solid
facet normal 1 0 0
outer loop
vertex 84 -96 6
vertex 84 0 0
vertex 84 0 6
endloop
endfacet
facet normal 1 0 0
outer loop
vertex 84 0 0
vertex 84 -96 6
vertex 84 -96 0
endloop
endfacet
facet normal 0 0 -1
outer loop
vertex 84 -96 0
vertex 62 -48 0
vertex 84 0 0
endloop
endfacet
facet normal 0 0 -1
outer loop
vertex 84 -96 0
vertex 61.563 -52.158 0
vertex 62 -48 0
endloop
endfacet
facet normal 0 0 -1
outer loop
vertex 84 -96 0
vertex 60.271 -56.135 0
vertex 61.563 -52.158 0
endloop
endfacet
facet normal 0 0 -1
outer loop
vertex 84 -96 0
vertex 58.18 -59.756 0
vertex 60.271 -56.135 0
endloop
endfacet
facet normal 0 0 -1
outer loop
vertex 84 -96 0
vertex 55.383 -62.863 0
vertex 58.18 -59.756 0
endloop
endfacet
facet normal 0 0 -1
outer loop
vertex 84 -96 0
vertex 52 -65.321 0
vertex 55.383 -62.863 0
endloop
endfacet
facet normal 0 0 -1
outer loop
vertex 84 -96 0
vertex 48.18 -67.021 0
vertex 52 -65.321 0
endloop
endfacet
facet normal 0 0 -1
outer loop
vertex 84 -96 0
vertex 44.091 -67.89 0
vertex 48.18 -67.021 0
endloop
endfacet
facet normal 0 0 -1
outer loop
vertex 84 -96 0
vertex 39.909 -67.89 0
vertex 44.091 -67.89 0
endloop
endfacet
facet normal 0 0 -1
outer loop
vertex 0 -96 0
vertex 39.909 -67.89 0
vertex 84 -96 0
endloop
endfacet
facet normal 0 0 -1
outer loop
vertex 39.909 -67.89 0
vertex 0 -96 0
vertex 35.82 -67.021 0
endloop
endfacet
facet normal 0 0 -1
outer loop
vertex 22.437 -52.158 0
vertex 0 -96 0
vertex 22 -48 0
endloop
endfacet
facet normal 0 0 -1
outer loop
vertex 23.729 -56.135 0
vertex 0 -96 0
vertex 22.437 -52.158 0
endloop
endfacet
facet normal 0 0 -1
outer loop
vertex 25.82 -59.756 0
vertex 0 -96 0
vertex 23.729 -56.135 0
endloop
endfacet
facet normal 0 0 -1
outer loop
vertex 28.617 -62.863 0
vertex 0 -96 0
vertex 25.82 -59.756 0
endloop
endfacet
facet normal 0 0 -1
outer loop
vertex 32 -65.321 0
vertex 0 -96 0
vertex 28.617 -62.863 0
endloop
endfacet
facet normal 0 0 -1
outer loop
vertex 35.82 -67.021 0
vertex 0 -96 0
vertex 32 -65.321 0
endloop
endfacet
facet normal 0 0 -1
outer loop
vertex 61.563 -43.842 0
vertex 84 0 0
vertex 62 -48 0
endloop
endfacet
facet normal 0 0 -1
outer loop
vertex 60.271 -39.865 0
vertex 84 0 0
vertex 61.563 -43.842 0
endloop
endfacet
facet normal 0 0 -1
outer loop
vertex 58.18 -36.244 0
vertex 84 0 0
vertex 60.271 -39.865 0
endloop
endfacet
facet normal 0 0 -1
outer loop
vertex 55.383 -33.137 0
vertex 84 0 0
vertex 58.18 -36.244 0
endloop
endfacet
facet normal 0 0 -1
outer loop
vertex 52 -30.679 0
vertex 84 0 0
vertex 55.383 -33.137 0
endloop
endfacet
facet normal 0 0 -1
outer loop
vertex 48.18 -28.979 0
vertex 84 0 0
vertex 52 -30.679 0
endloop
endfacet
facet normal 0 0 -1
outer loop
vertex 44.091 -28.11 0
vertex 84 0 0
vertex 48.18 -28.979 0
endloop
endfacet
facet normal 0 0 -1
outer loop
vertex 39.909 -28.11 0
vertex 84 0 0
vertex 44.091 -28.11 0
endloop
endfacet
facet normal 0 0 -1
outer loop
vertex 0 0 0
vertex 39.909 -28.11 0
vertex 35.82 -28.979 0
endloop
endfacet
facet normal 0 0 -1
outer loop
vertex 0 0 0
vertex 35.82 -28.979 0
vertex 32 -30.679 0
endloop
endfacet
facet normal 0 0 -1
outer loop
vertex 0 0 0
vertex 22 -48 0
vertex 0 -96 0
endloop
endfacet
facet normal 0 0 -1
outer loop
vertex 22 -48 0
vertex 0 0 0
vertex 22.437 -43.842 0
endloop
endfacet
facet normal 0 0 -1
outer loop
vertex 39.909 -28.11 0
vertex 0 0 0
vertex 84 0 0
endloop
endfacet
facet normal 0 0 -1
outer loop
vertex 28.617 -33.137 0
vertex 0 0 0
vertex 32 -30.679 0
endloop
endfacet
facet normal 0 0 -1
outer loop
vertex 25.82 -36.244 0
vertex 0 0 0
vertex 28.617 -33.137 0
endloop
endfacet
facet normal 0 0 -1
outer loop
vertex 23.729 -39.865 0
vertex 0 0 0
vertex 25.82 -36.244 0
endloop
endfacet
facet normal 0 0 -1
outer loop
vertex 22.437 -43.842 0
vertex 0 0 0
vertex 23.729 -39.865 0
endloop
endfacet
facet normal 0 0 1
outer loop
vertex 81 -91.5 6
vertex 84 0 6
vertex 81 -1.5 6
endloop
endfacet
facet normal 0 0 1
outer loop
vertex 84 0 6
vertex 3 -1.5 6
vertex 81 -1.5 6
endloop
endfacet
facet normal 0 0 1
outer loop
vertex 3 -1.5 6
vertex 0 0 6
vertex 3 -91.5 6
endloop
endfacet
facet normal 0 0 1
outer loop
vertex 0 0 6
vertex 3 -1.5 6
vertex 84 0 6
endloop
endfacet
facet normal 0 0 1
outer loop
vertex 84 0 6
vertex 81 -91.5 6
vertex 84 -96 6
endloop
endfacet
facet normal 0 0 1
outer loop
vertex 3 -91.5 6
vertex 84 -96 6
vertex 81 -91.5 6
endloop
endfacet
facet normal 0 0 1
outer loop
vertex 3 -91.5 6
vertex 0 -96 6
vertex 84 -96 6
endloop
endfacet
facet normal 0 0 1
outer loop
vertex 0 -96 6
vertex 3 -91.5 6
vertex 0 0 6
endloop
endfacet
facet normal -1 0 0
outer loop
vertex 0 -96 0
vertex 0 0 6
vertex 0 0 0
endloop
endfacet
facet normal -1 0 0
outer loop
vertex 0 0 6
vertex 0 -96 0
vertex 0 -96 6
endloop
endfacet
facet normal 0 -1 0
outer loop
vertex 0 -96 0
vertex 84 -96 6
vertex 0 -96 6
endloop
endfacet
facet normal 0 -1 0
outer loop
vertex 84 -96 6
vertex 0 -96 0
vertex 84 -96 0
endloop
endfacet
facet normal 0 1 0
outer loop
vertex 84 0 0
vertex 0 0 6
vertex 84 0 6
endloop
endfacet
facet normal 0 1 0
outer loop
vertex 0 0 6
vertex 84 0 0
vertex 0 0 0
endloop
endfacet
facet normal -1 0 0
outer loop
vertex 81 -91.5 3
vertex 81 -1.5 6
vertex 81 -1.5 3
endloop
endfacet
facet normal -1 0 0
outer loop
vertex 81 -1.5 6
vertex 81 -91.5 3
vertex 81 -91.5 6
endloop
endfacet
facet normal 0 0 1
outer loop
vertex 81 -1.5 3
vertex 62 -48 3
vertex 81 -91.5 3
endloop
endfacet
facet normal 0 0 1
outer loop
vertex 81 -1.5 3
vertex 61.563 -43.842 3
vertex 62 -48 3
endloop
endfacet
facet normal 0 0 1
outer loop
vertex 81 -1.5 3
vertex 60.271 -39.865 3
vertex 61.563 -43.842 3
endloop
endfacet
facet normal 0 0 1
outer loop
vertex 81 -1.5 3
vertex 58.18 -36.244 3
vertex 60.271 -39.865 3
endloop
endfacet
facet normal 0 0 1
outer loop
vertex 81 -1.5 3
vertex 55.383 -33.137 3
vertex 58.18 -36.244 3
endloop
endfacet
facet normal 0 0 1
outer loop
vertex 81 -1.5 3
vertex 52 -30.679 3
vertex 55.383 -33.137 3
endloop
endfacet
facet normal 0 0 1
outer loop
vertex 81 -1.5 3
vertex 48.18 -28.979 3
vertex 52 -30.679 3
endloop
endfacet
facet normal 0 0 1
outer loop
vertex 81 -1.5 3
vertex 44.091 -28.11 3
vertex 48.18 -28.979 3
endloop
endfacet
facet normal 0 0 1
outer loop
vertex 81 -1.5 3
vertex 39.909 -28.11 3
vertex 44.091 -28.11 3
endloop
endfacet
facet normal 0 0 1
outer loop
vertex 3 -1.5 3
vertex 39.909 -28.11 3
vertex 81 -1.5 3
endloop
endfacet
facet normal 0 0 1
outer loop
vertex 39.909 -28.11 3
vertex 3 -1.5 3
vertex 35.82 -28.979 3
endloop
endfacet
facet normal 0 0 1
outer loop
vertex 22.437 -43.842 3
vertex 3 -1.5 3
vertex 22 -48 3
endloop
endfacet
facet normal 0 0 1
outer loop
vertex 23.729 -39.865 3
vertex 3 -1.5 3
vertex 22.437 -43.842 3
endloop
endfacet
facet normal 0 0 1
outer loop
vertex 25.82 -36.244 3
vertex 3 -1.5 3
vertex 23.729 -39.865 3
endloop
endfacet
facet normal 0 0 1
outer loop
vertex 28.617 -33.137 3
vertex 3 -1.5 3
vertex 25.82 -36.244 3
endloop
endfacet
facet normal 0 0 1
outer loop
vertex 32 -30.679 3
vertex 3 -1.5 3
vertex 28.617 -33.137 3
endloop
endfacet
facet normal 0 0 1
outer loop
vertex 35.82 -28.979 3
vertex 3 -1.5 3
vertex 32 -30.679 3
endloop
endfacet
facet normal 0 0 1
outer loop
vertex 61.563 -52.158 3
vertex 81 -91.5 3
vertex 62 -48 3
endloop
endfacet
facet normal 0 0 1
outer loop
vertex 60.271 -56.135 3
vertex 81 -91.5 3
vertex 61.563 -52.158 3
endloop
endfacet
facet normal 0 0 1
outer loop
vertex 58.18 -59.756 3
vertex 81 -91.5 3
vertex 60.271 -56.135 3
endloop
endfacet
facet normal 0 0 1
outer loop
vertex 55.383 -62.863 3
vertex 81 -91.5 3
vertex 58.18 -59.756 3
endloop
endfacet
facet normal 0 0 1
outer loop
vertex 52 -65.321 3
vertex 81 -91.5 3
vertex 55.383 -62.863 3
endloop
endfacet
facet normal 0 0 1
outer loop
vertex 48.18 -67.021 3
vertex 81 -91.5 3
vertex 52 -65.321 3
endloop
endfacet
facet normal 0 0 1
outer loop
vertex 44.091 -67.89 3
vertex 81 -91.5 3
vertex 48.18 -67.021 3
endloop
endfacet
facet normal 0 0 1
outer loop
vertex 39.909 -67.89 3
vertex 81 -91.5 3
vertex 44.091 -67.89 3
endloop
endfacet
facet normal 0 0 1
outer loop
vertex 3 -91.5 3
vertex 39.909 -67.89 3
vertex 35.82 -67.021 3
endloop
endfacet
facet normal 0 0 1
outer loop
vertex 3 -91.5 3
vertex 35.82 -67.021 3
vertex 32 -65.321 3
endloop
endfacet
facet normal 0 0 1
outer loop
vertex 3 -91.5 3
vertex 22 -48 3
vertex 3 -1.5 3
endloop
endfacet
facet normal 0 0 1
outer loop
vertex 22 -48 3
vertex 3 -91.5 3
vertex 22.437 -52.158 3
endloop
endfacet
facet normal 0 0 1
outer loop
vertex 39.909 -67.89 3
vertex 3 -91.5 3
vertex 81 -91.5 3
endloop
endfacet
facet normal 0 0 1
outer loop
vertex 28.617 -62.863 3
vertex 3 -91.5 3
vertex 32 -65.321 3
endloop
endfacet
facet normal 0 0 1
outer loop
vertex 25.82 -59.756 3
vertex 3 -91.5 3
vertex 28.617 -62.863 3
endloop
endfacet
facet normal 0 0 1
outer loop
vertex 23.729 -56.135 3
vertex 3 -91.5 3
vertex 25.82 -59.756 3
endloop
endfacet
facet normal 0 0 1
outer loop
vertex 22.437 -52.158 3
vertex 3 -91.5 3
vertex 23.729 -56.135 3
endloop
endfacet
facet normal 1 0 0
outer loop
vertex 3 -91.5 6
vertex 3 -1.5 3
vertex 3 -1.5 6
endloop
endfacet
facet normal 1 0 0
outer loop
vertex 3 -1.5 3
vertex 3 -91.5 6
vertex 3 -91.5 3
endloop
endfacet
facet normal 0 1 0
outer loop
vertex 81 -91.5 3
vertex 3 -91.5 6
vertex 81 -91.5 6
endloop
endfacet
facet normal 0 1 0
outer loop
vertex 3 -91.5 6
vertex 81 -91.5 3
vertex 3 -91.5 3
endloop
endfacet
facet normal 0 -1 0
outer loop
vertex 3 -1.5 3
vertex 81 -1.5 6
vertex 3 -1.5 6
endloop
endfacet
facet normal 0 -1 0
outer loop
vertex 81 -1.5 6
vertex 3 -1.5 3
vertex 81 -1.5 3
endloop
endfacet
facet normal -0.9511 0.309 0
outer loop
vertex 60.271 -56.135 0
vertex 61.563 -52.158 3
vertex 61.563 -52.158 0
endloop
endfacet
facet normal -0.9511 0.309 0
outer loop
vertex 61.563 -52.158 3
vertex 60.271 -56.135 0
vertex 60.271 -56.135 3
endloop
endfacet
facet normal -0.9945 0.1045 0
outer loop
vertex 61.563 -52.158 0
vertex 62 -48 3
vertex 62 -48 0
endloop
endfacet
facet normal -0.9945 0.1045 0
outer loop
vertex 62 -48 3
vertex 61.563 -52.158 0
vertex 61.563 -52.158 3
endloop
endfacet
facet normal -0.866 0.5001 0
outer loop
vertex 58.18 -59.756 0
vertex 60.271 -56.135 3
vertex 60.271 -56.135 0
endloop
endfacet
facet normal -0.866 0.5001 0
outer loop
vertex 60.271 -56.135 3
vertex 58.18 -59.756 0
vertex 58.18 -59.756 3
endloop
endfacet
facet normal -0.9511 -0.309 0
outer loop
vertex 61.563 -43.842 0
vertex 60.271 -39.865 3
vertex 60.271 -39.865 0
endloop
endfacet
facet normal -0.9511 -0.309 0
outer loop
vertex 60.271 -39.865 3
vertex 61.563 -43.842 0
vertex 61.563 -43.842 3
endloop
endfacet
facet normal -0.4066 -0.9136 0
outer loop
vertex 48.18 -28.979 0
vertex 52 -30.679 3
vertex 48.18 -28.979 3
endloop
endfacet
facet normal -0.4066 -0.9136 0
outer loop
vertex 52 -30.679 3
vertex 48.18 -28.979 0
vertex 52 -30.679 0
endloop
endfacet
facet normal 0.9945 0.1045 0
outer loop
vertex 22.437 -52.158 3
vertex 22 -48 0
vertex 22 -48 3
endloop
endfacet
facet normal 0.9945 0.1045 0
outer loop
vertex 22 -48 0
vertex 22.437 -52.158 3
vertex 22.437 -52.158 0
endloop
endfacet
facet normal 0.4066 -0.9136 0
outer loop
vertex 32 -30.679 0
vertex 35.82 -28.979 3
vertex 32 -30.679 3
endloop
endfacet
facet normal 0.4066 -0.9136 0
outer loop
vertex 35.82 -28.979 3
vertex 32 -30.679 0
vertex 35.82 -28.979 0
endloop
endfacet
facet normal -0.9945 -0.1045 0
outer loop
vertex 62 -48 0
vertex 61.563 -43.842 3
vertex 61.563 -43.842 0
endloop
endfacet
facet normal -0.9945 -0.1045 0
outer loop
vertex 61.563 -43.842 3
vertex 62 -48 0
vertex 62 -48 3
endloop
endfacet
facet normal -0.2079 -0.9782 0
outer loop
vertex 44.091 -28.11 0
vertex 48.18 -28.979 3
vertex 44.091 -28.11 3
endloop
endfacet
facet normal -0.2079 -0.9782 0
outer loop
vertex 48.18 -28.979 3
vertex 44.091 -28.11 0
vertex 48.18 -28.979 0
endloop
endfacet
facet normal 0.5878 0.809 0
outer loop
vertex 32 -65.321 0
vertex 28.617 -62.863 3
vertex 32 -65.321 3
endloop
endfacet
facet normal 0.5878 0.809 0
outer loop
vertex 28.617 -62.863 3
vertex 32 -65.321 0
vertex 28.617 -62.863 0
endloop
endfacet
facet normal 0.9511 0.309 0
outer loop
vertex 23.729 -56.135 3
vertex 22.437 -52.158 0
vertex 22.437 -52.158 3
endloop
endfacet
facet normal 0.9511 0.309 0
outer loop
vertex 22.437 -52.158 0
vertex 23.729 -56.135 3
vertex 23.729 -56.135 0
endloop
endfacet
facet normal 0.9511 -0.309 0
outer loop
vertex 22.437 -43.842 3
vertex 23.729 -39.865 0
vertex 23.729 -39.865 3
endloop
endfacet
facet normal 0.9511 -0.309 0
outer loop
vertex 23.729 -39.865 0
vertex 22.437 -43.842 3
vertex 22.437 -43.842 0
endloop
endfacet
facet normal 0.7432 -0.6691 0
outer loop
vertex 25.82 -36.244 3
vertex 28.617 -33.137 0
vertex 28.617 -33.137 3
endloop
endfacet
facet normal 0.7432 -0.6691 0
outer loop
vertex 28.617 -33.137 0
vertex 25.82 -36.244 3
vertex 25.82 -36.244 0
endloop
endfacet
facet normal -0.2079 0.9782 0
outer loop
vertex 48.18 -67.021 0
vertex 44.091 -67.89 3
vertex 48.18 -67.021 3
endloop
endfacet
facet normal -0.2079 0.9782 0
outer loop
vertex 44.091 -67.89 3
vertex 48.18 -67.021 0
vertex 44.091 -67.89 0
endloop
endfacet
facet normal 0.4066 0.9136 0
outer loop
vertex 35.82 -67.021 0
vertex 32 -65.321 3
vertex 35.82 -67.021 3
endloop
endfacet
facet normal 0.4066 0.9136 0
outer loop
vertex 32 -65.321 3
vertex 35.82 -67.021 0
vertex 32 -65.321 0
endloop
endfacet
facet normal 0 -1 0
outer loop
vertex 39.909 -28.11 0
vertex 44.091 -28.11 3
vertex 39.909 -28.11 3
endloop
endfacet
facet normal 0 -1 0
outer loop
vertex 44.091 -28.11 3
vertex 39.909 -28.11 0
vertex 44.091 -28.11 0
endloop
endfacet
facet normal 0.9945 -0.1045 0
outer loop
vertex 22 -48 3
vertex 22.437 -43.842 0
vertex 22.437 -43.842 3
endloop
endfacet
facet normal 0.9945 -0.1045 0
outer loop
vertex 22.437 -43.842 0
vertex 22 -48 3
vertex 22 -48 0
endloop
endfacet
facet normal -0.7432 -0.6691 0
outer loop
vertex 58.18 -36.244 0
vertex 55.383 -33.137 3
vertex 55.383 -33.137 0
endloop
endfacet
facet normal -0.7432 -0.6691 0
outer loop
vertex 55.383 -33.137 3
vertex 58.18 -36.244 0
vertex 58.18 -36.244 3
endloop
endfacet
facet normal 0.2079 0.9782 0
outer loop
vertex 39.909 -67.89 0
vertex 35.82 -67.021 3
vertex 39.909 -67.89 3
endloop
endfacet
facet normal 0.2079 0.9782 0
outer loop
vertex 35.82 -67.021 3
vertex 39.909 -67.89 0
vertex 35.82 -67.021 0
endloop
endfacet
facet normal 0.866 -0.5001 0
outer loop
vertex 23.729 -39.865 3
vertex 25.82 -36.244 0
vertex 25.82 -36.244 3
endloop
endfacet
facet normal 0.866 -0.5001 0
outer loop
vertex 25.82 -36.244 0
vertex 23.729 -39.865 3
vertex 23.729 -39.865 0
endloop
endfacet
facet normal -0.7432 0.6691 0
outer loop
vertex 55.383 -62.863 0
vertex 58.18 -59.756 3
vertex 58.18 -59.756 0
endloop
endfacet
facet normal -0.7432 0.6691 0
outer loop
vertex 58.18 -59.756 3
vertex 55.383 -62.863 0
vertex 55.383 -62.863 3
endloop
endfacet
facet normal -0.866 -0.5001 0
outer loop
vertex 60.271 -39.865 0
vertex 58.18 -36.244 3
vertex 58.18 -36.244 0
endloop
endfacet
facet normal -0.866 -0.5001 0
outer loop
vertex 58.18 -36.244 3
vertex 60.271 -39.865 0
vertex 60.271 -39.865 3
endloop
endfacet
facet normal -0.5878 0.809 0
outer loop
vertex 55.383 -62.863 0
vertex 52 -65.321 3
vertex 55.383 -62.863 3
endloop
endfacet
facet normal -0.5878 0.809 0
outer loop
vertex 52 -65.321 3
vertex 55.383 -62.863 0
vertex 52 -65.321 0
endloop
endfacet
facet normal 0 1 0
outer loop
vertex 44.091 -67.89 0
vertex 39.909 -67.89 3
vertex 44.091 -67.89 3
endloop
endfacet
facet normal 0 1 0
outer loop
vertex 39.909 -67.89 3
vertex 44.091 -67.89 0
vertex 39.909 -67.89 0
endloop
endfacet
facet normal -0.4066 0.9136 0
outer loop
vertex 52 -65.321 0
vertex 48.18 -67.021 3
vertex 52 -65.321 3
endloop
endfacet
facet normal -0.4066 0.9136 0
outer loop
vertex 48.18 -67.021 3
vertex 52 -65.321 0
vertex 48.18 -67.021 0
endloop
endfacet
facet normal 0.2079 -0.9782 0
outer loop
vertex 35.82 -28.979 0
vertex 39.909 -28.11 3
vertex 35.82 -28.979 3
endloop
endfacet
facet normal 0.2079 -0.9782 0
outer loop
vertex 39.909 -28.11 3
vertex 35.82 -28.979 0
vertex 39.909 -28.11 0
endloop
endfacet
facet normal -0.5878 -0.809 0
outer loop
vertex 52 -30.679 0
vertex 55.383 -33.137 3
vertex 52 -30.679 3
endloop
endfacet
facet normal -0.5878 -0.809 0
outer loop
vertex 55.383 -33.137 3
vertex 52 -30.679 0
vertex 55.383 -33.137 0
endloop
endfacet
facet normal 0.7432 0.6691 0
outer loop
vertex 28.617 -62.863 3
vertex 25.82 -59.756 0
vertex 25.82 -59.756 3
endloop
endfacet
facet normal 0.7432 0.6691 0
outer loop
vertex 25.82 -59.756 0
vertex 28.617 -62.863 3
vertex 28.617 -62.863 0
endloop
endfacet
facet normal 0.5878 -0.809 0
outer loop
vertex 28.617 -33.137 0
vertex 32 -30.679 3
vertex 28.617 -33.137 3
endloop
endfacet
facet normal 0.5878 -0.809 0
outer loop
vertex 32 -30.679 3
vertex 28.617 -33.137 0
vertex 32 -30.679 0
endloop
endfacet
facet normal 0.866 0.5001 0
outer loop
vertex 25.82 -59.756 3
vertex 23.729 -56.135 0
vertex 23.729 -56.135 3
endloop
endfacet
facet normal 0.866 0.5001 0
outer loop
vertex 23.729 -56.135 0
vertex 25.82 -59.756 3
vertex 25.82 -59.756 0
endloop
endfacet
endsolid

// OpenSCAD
// file: ../../../../neje-dk-8-kz-bed.scad
module nejeDk8KzBed()
{
	xLength = nejeDk8KzBed_xLength();
	yLength = nejeDk8KzBed_yLength();
	zLength = nejeDk8KzBed_zLength();

	cube([xLength, yLength, zLength]);
}

/** Support functions and modules follow. **/

function nejeDk8KzBed_xLength() = 78;

function nejeDk8KzBed_yLength() = 90;

function nejeDk8KzBed_zLength() = 3;
// file: ../../../../../laser-engraver-jig.scad
module laserEngraverJig(bed_xLength, bed_yLength, bed_zLength,
						xLength, yLength, zLength)
{
	laserEngraverJig_base(bed_xLength, bed_yLength, bed_zLength,
						  xLength, yLength, zLength);
}

/** Support functions and modules follow. **/

module laserEngraverJig_base(bed_xLength, bed_yLength, bed_zLength,
							 xLength, yLength, zLength)
{
	difference()
	{
		// main block
		cube([xLength, yLength, zLength]);

		// bed cutout
		xTranslate = (xLength - bed_xLength) / 2.0;
		yTranslate = (yLength - bed_yLength) / 2.0;
		color("green")
		translate([xTranslate, yTranslate, -0.01])
		cube([bed_xLength, bed_yLength, bed_zLength + 0.01]);
	}
}
// file: ../../neje-laser-engraver-disk-jig.scad
use <../../../laser-engraver-jig.scad>

use <../../neje-dk-8-kz-bed.scad>

module nejeLaserEngraverDiskJig(diameter = 40)
{
	bed_xLength = nejeDk8KzBed_xLength();
	bed_yLength = nejeDk8KzBed_yLength();
	bed_zLength = nejeDk8KzBed_zLength();

	xyIncrease = 3 * 2;

	xLength = nejeDk8KzBed_xLength() + xyIncrease;
	yLength = nejeDk8KzBed_yLength() + xyIncrease;
	zLength = nejeLaserEngraverDiskJig_zLength();

	difference()
	{
		nejeLaserEngraverDiskJig_block(bed_xLength, bed_yLength, bed_zLength,
						 			   xLength, yLength, zLength);

		nejeLaserEngraverDiskJig_cutout(diameter, xLength, yLength, zLength);
	}
}

/** Support functions and modules follow. **/

function nejeLaserEngraverDiskJig_zLength() = nejeDk8KzBed_zLength() * 2;

module nejeLaserEngraverDiskJig_block(bed_xLength, bed_yLength, bed_zLength,
				 					  xLength, yLength, zLength)
{
	laserEngraverJig(bed_xLength, bed_yLength, bed_zLength,
					 xLength, yLength, zLength);
}

module nejeLaserEngraverDiskJig_cutout(diameter, xLength, yLength, zLength)
{
	radius = diameter / 2.0;
	xTranslate = xLength / 2.0;
	yTranslate = yLength / 2.0;
	translate([xTranslate, yTranslate, -0.01])
	cylinder(r=radius, h=10);
}
// main file
use <../../neje-laser-engraver-disk-jig.scad>

cutoutDiameter = 40; // [5:100]

zTranslate = nejeLaserEngraverDiskJig_zLength();

translate([0,0,zTranslate])
rotate([180, 0, 0])
nejeLaserEngraverDiskJig(diameter = cutoutDiameter);
